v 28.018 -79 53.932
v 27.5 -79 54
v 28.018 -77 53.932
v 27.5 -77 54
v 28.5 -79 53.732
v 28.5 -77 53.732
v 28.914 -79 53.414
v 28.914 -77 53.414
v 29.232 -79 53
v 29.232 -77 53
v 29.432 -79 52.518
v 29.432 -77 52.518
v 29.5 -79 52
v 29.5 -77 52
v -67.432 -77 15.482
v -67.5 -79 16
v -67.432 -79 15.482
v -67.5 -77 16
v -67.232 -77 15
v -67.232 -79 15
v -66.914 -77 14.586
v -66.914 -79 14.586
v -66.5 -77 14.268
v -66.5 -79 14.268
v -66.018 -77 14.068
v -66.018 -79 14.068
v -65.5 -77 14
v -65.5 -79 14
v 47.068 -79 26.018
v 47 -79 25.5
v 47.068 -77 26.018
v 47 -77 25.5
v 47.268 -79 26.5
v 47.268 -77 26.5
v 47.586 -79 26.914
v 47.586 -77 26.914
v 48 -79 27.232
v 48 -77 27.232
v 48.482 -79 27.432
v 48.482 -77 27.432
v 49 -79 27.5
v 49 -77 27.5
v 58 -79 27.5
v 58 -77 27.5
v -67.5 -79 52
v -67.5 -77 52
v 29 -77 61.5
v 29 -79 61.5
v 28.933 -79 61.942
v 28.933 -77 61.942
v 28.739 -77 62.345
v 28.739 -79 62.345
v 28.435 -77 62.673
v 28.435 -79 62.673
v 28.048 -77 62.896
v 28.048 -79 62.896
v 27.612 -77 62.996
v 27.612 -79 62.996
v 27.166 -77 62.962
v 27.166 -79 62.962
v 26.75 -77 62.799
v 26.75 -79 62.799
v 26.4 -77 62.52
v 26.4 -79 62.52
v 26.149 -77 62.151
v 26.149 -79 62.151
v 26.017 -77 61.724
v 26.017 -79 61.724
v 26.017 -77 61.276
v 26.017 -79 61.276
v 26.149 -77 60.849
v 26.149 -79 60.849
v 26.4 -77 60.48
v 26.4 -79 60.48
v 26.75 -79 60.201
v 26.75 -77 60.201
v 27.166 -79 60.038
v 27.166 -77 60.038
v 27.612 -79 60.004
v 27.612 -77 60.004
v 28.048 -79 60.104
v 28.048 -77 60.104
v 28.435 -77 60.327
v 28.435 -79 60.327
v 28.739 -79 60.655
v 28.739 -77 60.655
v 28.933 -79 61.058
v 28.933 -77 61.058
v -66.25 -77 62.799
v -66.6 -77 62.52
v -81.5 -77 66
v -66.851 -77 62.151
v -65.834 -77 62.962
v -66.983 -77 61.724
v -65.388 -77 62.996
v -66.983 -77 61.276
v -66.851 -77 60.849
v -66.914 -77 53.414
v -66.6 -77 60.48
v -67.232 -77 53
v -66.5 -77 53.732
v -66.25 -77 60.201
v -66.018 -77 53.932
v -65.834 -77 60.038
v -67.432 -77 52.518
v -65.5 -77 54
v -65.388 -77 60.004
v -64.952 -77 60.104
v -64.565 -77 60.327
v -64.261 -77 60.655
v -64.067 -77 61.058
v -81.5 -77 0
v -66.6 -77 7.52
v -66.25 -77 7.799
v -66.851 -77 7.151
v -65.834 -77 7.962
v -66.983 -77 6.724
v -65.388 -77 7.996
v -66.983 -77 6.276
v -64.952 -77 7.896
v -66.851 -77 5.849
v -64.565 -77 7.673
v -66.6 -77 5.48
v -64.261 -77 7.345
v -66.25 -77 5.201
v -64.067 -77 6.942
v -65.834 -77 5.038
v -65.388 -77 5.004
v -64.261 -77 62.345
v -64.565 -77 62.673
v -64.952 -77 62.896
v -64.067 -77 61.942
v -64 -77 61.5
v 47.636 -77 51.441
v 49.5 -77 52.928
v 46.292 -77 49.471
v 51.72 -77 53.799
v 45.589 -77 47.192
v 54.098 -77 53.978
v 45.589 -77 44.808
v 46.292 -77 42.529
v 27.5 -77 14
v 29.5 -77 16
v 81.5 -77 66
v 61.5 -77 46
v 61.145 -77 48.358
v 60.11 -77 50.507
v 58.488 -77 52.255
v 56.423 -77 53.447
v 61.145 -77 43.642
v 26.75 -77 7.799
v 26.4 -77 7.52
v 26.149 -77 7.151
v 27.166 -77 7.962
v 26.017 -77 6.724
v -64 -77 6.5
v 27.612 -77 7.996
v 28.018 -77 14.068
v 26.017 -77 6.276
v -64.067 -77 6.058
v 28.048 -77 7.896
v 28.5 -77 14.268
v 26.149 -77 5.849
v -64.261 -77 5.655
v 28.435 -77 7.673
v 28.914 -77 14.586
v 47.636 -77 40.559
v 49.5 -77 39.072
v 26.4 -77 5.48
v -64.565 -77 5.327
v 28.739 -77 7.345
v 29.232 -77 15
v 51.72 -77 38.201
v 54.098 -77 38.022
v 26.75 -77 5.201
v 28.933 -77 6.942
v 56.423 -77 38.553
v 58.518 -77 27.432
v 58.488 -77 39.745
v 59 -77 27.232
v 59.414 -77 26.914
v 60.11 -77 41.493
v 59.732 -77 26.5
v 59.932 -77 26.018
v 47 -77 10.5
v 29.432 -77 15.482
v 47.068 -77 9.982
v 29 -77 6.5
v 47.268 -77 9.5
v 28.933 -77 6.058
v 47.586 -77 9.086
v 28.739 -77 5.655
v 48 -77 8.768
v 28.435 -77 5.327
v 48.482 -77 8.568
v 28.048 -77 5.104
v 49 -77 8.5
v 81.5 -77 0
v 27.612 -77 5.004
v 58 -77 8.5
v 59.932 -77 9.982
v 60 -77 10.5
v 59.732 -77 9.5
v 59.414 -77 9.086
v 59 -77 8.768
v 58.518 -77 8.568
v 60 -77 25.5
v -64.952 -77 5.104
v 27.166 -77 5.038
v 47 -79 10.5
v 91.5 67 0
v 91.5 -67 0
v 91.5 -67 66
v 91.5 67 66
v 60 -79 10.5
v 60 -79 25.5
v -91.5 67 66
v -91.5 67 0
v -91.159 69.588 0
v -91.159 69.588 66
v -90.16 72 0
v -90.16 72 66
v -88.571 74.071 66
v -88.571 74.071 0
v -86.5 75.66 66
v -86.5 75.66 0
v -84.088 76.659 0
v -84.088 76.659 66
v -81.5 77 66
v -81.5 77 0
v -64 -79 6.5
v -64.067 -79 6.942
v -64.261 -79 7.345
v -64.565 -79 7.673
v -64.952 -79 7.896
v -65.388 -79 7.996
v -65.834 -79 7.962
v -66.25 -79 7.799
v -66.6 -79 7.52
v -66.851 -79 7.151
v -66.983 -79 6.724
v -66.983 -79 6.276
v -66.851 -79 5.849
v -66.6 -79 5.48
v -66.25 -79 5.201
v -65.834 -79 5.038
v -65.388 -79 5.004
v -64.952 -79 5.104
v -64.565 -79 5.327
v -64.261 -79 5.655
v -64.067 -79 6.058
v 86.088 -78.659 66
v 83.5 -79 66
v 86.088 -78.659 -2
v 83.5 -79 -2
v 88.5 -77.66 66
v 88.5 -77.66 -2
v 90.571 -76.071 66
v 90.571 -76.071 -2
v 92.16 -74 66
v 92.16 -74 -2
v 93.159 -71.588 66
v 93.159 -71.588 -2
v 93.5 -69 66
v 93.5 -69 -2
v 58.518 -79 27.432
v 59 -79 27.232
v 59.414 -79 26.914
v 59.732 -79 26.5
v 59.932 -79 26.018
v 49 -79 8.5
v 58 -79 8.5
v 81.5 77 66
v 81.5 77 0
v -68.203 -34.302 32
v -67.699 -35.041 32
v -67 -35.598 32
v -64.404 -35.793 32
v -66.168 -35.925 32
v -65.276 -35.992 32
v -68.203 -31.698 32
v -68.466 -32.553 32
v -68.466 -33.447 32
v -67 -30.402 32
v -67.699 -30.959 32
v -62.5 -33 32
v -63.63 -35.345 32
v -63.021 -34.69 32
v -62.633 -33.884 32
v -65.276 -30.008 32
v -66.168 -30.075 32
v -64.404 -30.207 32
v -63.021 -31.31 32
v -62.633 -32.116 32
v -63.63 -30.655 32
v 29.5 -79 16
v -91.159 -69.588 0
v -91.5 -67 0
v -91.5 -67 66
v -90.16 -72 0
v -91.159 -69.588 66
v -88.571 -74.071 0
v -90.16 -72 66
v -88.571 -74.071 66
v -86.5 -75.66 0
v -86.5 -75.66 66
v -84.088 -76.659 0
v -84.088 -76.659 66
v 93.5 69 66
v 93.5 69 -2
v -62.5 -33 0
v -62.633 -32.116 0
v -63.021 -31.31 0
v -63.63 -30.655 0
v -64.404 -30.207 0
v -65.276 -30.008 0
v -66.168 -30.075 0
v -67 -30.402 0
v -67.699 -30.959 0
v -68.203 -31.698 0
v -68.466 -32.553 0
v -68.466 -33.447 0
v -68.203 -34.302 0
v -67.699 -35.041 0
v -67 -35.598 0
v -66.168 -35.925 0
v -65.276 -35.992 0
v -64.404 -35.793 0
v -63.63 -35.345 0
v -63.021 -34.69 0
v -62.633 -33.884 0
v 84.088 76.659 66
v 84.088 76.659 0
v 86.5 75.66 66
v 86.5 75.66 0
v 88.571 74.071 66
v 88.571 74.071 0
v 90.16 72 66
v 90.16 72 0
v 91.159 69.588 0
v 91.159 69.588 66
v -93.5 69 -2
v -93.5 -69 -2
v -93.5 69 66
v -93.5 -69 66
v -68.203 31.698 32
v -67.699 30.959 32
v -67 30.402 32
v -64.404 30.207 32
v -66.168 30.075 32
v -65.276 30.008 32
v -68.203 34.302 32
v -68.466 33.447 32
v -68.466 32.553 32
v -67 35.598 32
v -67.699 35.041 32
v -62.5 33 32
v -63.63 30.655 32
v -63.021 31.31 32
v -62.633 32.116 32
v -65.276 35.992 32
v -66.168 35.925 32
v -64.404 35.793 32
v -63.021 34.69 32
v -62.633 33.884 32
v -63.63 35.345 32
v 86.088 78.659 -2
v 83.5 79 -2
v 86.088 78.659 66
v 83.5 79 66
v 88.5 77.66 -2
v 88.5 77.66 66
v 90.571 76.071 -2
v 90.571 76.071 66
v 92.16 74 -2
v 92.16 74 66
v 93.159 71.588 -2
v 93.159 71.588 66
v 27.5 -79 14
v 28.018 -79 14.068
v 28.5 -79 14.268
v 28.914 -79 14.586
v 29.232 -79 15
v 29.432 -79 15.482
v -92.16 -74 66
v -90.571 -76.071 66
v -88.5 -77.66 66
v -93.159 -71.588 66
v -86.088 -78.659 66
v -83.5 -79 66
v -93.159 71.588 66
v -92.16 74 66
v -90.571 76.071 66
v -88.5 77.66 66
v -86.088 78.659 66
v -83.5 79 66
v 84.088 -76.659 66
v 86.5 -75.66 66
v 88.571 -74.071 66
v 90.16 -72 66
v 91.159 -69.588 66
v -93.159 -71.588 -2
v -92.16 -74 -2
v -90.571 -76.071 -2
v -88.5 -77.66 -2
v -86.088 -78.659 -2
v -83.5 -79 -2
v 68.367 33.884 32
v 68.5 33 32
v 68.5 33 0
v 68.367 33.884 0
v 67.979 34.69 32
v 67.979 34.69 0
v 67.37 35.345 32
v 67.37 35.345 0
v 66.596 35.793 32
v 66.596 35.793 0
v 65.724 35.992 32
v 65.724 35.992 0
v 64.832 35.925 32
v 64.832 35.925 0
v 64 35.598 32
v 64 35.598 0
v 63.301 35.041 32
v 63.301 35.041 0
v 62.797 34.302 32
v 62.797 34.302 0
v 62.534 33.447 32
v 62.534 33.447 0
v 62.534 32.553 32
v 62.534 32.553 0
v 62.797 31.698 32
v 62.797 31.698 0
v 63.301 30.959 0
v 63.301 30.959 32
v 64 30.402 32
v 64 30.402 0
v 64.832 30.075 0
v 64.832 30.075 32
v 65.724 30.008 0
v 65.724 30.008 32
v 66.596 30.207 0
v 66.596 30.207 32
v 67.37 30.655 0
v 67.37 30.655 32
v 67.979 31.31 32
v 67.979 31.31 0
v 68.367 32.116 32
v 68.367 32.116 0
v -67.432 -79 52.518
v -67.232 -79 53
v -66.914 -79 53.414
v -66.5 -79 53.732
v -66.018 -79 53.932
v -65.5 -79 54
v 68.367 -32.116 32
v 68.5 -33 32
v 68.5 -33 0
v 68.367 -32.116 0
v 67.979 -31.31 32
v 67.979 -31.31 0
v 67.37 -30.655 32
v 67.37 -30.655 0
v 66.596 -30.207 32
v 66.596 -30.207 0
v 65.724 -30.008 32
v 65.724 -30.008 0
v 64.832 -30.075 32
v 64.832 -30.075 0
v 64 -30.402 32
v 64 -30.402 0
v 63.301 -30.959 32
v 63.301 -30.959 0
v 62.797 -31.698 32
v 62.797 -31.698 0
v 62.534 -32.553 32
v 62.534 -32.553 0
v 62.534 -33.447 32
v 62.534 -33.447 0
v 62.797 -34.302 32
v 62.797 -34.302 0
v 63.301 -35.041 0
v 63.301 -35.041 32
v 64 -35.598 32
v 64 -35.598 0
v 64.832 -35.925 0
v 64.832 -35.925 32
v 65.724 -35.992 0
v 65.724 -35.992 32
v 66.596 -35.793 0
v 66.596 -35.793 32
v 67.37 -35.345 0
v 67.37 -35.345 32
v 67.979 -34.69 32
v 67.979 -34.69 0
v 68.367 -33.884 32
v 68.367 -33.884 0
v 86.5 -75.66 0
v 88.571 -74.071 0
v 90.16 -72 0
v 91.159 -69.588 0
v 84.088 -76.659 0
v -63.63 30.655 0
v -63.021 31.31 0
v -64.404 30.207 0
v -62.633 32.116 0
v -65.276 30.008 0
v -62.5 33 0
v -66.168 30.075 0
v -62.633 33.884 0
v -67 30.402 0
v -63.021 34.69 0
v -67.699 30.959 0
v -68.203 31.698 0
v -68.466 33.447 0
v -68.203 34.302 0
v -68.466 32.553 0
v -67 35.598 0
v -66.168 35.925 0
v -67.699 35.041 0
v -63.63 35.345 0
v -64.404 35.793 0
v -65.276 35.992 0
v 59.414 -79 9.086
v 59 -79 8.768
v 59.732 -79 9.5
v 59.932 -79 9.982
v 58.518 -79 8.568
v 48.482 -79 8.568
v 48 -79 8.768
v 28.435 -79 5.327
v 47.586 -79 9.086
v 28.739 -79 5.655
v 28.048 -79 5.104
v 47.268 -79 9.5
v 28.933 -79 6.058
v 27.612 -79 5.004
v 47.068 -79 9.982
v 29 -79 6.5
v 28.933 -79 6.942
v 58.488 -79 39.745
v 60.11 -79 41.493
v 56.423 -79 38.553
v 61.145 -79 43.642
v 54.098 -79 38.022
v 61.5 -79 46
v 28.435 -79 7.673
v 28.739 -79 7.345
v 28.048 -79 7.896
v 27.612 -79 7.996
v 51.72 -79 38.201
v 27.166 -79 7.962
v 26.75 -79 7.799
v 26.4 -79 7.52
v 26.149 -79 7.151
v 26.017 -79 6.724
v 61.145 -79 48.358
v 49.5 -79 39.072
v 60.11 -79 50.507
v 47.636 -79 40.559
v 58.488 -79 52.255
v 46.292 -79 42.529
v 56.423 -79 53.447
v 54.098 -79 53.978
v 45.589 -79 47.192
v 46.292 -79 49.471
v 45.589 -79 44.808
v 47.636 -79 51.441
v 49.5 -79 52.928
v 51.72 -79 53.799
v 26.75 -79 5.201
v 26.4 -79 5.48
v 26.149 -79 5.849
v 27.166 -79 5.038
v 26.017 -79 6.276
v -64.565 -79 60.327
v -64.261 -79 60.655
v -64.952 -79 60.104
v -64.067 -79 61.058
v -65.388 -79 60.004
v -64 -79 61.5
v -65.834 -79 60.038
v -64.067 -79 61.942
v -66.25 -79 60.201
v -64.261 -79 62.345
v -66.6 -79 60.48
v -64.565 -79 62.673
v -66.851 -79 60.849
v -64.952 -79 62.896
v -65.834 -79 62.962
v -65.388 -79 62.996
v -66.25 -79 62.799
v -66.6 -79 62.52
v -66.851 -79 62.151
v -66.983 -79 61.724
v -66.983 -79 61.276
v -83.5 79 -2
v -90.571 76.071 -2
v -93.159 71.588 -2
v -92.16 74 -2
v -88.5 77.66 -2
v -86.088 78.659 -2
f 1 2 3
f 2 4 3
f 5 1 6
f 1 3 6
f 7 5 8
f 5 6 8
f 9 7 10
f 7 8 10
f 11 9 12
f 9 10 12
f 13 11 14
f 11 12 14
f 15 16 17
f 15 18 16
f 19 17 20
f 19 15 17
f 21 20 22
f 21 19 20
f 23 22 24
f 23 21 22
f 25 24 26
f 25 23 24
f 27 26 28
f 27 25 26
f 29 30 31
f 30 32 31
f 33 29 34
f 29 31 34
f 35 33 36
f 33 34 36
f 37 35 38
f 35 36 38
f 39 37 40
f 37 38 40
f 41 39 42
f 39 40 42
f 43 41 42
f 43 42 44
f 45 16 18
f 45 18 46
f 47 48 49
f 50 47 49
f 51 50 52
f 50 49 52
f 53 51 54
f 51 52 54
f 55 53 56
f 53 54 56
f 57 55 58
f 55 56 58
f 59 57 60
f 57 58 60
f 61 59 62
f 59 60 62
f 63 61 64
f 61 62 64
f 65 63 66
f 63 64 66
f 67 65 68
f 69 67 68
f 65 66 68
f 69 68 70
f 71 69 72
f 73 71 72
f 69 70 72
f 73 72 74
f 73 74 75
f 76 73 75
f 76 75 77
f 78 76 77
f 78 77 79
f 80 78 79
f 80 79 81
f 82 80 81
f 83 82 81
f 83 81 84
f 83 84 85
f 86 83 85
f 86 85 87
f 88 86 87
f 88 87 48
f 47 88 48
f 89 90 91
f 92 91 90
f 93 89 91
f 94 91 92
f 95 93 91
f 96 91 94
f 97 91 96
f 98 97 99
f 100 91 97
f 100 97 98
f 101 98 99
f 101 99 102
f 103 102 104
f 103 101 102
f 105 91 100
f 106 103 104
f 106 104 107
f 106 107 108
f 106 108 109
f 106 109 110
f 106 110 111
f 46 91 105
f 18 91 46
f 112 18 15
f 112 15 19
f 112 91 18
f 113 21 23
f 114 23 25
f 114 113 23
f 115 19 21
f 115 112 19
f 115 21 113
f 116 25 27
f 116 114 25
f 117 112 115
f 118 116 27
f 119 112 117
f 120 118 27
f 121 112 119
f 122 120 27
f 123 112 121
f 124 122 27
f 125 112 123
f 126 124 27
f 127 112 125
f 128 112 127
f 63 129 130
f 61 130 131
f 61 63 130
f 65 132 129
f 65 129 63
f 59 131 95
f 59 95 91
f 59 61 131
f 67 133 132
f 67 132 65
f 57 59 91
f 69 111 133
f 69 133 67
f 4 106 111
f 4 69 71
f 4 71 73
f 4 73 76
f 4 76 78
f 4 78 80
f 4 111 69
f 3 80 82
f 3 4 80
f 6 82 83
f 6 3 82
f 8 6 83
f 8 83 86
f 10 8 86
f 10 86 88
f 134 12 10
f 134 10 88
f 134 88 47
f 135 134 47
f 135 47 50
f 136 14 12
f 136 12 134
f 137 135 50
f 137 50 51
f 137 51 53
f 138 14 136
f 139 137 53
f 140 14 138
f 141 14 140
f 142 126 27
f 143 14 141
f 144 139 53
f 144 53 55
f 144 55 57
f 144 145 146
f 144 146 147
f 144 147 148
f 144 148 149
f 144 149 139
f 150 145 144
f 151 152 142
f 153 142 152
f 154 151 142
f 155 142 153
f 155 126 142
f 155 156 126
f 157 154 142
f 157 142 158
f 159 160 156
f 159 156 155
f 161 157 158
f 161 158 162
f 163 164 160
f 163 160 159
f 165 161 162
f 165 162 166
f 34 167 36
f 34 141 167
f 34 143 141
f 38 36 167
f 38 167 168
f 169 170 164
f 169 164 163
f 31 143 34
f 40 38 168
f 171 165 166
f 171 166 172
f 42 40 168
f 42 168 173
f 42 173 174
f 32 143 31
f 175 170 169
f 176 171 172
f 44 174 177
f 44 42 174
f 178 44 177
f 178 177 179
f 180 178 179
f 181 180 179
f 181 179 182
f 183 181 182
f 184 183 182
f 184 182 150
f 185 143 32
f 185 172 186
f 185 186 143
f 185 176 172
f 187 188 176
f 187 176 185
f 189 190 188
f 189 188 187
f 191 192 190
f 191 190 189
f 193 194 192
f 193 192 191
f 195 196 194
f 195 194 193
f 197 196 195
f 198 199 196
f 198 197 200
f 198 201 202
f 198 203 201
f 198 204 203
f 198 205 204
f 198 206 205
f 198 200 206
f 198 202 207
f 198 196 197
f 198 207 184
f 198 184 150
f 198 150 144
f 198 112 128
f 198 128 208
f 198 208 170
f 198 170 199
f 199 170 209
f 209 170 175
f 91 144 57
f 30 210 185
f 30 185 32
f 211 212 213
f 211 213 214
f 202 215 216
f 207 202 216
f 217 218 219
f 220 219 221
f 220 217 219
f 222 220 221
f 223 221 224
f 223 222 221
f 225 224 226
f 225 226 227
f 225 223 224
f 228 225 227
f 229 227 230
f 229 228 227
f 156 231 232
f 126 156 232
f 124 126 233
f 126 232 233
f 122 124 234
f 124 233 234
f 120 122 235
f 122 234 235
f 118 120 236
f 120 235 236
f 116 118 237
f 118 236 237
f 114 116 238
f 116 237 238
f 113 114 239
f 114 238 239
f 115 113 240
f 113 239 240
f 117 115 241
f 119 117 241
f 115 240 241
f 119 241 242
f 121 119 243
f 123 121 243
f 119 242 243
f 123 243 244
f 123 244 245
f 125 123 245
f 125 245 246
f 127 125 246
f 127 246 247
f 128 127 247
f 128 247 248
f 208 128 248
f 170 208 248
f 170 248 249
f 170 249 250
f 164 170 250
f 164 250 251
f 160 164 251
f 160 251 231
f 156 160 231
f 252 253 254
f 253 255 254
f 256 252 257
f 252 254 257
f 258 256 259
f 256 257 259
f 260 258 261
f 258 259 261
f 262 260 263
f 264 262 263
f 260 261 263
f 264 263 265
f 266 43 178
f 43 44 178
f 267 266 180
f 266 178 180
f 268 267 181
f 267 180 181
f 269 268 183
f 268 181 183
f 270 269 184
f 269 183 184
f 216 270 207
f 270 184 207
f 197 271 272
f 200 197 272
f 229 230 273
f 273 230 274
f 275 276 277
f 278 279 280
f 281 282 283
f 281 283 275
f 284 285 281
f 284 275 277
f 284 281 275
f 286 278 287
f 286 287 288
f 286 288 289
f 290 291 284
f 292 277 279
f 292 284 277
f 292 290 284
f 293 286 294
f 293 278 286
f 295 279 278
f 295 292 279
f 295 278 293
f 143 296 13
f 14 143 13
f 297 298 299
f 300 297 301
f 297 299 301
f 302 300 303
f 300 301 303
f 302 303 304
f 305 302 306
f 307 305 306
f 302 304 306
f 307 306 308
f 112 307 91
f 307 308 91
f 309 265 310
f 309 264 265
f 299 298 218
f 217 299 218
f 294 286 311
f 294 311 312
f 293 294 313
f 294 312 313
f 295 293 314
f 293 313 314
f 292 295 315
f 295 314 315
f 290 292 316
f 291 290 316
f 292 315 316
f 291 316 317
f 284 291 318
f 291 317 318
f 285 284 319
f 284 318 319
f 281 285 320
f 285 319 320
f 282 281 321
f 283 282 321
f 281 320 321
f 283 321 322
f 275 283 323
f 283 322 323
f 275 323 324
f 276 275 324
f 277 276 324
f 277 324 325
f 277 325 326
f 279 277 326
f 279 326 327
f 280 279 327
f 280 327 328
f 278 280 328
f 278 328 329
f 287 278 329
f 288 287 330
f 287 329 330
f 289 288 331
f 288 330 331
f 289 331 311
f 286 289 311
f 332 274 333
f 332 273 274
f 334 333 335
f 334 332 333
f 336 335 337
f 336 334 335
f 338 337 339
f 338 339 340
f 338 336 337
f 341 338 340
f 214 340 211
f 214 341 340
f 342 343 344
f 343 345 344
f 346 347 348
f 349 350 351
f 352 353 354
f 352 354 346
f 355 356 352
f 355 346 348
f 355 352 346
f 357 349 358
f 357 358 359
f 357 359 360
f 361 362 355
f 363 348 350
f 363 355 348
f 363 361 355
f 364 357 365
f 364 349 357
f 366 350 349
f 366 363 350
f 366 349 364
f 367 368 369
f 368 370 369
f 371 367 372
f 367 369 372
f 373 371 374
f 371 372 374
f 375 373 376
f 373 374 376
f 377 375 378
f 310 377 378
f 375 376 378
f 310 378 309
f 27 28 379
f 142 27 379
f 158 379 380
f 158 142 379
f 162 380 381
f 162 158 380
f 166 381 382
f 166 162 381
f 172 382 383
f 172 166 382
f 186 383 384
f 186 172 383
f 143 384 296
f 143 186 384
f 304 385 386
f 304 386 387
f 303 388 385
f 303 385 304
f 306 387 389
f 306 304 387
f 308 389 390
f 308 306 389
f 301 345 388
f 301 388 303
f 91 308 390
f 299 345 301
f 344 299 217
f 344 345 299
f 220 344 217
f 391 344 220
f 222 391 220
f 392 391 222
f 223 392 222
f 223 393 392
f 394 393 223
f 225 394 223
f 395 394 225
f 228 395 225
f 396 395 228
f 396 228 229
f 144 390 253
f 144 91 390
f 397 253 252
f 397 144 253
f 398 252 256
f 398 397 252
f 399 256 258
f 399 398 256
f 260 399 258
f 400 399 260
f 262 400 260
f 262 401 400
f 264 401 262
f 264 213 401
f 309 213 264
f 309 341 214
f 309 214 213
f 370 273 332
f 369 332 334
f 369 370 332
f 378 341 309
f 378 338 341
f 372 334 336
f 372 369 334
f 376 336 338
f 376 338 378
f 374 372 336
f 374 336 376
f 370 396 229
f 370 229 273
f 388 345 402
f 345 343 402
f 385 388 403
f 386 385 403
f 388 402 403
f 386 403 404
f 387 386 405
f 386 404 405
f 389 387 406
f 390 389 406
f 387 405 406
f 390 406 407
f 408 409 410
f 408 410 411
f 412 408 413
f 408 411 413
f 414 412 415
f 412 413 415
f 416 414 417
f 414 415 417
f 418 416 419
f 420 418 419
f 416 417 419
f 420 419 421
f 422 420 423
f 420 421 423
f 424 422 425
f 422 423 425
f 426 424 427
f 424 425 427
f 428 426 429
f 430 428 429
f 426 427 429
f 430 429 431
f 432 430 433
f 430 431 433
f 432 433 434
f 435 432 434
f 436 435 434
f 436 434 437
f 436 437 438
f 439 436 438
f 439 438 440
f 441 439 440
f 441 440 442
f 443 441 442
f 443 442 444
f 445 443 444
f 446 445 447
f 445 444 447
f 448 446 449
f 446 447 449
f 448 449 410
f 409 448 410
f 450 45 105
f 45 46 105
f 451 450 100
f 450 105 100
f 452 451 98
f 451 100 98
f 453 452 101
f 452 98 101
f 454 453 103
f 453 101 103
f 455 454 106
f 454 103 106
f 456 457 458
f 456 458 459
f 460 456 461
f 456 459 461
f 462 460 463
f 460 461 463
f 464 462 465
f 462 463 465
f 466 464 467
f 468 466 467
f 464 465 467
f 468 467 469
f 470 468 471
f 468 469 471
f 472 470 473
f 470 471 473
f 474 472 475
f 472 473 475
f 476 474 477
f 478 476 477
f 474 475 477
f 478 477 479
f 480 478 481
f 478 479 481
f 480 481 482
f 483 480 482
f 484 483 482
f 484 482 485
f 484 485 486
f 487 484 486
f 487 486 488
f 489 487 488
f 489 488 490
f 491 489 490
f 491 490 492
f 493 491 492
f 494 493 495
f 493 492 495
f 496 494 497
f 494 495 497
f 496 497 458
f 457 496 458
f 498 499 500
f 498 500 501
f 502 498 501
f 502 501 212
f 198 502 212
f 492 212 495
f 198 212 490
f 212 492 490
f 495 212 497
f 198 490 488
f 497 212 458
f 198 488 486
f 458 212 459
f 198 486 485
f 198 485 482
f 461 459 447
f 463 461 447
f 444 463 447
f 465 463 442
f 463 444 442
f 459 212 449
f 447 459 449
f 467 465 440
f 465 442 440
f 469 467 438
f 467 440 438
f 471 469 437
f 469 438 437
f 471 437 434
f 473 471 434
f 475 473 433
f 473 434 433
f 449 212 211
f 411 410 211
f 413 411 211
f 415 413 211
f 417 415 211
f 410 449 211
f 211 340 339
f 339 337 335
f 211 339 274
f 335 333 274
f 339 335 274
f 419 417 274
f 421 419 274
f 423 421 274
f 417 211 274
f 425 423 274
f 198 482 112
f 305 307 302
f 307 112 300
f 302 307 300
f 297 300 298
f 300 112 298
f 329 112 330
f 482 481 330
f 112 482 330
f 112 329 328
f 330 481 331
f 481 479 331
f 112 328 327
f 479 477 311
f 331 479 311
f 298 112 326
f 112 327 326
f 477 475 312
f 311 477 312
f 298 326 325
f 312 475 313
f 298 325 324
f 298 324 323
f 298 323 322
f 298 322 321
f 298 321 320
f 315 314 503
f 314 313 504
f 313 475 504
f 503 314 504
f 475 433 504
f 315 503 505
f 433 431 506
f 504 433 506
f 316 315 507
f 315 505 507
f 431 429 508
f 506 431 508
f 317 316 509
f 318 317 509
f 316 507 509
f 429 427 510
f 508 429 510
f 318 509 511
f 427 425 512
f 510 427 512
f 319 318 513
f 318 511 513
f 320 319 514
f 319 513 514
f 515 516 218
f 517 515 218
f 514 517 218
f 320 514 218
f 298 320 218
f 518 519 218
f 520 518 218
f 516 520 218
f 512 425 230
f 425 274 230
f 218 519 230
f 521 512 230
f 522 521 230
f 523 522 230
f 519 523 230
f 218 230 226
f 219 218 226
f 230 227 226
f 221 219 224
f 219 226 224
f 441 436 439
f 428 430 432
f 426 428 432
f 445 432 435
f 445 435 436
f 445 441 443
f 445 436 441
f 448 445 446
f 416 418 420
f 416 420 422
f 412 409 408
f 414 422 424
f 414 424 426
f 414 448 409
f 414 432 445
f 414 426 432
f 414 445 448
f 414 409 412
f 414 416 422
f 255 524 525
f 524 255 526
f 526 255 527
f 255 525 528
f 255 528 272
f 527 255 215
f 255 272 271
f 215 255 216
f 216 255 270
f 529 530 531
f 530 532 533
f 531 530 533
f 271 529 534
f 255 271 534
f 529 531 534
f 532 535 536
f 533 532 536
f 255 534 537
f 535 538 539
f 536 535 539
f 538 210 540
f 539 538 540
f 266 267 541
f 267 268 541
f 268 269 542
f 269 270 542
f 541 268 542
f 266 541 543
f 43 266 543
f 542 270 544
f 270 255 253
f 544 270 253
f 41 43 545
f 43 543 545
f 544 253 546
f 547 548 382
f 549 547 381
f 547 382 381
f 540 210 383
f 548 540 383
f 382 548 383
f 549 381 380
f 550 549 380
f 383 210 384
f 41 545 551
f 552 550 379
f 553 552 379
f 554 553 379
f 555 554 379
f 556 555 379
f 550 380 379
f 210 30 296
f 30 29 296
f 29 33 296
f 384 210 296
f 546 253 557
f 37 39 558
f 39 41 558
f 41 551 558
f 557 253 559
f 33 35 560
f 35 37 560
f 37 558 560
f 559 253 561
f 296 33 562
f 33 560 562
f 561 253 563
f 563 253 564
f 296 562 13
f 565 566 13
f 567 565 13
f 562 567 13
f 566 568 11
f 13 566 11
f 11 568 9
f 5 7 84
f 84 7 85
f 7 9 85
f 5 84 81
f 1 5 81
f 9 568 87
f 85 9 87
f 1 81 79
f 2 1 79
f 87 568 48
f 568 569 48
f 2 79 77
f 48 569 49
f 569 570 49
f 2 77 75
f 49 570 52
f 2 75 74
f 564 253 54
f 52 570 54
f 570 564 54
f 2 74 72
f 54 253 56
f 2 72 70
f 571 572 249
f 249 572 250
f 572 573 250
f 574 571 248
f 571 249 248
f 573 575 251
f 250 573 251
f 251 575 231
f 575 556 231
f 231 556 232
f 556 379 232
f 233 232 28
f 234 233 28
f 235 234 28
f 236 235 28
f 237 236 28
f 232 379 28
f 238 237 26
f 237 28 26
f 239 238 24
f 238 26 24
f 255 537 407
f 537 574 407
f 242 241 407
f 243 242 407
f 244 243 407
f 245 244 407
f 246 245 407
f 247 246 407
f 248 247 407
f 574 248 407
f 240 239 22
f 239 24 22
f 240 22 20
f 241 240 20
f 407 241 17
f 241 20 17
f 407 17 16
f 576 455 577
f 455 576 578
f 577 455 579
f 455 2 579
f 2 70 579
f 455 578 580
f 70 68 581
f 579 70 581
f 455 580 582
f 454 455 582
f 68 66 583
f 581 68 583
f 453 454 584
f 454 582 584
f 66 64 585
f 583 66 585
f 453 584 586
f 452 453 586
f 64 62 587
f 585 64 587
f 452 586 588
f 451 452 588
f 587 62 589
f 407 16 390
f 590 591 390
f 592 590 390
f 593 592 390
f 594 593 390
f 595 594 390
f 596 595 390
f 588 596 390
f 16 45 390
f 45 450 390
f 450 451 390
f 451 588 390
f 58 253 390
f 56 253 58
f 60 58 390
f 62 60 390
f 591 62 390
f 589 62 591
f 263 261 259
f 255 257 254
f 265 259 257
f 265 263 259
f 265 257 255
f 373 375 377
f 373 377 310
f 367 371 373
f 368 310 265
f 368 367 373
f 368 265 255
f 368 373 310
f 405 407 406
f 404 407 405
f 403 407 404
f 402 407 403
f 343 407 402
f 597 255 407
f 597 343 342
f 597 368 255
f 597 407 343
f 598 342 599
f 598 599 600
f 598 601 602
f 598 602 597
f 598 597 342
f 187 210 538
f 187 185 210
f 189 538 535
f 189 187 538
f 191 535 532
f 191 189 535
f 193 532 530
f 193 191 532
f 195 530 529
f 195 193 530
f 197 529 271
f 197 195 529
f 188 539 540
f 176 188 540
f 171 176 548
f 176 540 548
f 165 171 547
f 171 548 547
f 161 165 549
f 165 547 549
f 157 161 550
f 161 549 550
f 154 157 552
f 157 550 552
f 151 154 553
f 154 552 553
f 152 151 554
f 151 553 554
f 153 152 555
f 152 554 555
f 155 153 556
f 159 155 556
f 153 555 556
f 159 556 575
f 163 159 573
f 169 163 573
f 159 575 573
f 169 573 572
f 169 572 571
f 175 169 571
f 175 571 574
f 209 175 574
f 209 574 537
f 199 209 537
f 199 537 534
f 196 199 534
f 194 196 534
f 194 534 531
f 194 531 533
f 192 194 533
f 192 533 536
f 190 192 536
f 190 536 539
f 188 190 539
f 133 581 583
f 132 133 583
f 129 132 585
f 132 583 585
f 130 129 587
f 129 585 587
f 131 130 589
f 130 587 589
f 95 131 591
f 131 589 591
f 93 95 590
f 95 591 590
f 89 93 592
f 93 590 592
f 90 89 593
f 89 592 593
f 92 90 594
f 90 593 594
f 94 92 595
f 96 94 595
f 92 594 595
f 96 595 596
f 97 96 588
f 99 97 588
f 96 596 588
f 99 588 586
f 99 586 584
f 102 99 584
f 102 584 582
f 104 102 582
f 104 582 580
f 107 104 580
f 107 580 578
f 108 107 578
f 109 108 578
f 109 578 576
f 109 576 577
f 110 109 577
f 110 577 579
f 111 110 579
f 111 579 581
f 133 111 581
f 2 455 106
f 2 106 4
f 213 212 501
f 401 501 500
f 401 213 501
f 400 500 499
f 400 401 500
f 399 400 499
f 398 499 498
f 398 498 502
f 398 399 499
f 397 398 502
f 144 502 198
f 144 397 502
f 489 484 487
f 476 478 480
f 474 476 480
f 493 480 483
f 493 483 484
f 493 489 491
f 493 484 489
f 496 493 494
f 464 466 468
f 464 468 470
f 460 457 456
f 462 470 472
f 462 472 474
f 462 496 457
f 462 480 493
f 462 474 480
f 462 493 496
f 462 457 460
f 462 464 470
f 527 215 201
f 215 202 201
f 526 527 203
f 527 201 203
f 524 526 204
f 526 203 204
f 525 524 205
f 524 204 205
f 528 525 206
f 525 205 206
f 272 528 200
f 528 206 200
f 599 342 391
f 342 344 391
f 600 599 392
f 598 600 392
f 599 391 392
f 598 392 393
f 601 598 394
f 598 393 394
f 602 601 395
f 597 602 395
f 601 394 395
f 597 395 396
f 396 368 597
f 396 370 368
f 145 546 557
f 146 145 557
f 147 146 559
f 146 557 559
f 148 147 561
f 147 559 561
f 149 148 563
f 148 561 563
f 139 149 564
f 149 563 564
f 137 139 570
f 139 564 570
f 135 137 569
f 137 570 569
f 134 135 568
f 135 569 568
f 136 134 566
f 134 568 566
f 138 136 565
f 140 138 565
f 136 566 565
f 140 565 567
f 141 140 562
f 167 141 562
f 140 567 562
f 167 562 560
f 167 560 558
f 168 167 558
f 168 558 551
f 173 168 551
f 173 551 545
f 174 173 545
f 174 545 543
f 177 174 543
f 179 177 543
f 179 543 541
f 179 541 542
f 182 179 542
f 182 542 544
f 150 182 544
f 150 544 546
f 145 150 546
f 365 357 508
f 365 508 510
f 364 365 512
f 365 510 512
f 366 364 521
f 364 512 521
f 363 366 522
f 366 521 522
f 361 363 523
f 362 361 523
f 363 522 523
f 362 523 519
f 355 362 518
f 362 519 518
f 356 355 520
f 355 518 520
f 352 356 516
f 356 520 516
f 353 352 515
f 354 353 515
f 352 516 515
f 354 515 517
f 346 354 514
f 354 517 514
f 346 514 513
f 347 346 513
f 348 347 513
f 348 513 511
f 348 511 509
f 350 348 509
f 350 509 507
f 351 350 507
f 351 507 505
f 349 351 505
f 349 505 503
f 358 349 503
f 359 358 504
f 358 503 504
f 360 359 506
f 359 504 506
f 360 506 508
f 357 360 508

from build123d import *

# Parameters (mm, degrees)
SKETCH1_W           = 187
SKETCH1_H           = 158
SKETCH1_W_2         = 183
SKETCH1_H_2         = 154
BOSS_EXTRUDE1_DEPTH = 66
SKETCH2_W           = 187
SKETCH2_H           = 158
BOSS_EXTRUDE2_DEPTH = 2
FILLET1_R           = 10
FILLET2_R           = 10
SKETCH3_R           = 3
BOSS_EXTRUDE3_DEPTH = 32
SKETCH4_W           = 97
SKETCH4_H           = 40
CUT_EXTRUDE1_DEPTH  = 10
SKETCH5_R           = 1.5
CUT_EXTRUDE2_DEPTH  = 10
SKETCH6_R           = 8
SKETCH6_W           = 13
SKETCH6_H           = 19
CUT_EXTRUDE3_DEPTH  = 10
FILLET3_R           = 2


with BuildPart() as part:
    # Sketch1 → Boss-Extrude1 (new body)
    with BuildSketch(Plane.XY):
        Rectangle(SKETCH1_W, SKETCH1_H)
        Rectangle(SKETCH1_W_2, SKETCH1_H_2, mode=Mode.SUBTRACT)
    extrude(amount=BOSS_EXTRUDE1_DEPTH)

    # Sketch2 → Boss-Extrude2 (add)
    with BuildSketch(Plane(origin=(0, 0, 0), x_dir=(-1, 0, 0), z_dir=(0, 0, -1))):
        Rectangle(SKETCH2_W, SKETCH2_H)
    extrude(amount=BOSS_EXTRUDE2_DEPTH)

    # Fillet1
    fillet1_edges = [part.edges().sort_by_distance(p)[0] for p in [
        (91.5, -77, 33),
        (91.5, 77, 33),
        (-91.5, 77, 33),
        (-91.5, -77, 33),
    ]]
    fillet(fillet1_edges, radius=FILLET1_R)

    # Fillet2
    fillet2_edges = [part.edges().sort_by_distance(p)[0] for p in [
        (93.5, -79, 32),
        (-93.5, -79, 32),
        (-93.5, 79, 32),
        (93.5, 79, 32),
    ]]
    fillet(fillet2_edges, radius=FILLET2_R)

    # Sketch3 → Boss-Extrude3 (add)
    with BuildSketch(Plane.XY):
        with Locations((-65.5, 33)):
            Circle(SKETCH3_R)
        with Locations((65.5, 33)):
            Circle(SKETCH3_R)
        with Locations((65.5, -33)):
            Circle(SKETCH3_R)
        with Locations((-65.5, -33)):
            Circle(SKETCH3_R)
    extrude(amount=BOSS_EXTRUDE3_DEPTH)

    # Sketch4 → Cut-Extrude1 (cut)
    with BuildSketch(Plane.XZ.offset(79)):
        with Locations((-19, 34)):
            Rectangle(SKETCH4_W, SKETCH4_H)
    extrude(amount=-CUT_EXTRUDE1_DEPTH, mode=Mode.SUBTRACT)

    # Sketch5 → Cut-Extrude2 (cut)
    with BuildSketch(Plane.XZ.offset(79)):
        with Locations((-65.5, 61.5)):
            Circle(SKETCH5_R)
        with Locations((27.5, 61.5)):
            Circle(SKETCH5_R)
        with Locations((-65.5, 6.5)):
            Circle(SKETCH5_R)
        with Locations((27.5, 6.5)):
            Circle(SKETCH5_R)
    extrude(amount=-CUT_EXTRUDE2_DEPTH, mode=Mode.SUBTRACT)

    # Sketch6 → Cut-Extrude3 (cut)
    with BuildSketch(Plane.XZ.offset(79)):
        with Locations((53.5, 46)):
            Circle(SKETCH6_R)
        with Locations((53.5, 18)):
            Rectangle(SKETCH6_W, SKETCH6_H)
    extrude(amount=-CUT_EXTRUDE3_DEPTH, mode=Mode.SUBTRACT)

    # Fillet3
    fillet3_edges = [part.edges().sort_by_distance(p)[0] for p in [
        (29.5, -78, 54),
        (29.5, -78, 14),
        (-67.5, -78, 14),
        (-67.5, -78, 54),
        (60, -78, 27.5),
        (60, -78, 8.5),
        (47, -78, 8.5),
        (47, -78, 27.5),
    ]]
    fillet(fillet3_edges, radius=FILLET3_R)


solid = part.part
